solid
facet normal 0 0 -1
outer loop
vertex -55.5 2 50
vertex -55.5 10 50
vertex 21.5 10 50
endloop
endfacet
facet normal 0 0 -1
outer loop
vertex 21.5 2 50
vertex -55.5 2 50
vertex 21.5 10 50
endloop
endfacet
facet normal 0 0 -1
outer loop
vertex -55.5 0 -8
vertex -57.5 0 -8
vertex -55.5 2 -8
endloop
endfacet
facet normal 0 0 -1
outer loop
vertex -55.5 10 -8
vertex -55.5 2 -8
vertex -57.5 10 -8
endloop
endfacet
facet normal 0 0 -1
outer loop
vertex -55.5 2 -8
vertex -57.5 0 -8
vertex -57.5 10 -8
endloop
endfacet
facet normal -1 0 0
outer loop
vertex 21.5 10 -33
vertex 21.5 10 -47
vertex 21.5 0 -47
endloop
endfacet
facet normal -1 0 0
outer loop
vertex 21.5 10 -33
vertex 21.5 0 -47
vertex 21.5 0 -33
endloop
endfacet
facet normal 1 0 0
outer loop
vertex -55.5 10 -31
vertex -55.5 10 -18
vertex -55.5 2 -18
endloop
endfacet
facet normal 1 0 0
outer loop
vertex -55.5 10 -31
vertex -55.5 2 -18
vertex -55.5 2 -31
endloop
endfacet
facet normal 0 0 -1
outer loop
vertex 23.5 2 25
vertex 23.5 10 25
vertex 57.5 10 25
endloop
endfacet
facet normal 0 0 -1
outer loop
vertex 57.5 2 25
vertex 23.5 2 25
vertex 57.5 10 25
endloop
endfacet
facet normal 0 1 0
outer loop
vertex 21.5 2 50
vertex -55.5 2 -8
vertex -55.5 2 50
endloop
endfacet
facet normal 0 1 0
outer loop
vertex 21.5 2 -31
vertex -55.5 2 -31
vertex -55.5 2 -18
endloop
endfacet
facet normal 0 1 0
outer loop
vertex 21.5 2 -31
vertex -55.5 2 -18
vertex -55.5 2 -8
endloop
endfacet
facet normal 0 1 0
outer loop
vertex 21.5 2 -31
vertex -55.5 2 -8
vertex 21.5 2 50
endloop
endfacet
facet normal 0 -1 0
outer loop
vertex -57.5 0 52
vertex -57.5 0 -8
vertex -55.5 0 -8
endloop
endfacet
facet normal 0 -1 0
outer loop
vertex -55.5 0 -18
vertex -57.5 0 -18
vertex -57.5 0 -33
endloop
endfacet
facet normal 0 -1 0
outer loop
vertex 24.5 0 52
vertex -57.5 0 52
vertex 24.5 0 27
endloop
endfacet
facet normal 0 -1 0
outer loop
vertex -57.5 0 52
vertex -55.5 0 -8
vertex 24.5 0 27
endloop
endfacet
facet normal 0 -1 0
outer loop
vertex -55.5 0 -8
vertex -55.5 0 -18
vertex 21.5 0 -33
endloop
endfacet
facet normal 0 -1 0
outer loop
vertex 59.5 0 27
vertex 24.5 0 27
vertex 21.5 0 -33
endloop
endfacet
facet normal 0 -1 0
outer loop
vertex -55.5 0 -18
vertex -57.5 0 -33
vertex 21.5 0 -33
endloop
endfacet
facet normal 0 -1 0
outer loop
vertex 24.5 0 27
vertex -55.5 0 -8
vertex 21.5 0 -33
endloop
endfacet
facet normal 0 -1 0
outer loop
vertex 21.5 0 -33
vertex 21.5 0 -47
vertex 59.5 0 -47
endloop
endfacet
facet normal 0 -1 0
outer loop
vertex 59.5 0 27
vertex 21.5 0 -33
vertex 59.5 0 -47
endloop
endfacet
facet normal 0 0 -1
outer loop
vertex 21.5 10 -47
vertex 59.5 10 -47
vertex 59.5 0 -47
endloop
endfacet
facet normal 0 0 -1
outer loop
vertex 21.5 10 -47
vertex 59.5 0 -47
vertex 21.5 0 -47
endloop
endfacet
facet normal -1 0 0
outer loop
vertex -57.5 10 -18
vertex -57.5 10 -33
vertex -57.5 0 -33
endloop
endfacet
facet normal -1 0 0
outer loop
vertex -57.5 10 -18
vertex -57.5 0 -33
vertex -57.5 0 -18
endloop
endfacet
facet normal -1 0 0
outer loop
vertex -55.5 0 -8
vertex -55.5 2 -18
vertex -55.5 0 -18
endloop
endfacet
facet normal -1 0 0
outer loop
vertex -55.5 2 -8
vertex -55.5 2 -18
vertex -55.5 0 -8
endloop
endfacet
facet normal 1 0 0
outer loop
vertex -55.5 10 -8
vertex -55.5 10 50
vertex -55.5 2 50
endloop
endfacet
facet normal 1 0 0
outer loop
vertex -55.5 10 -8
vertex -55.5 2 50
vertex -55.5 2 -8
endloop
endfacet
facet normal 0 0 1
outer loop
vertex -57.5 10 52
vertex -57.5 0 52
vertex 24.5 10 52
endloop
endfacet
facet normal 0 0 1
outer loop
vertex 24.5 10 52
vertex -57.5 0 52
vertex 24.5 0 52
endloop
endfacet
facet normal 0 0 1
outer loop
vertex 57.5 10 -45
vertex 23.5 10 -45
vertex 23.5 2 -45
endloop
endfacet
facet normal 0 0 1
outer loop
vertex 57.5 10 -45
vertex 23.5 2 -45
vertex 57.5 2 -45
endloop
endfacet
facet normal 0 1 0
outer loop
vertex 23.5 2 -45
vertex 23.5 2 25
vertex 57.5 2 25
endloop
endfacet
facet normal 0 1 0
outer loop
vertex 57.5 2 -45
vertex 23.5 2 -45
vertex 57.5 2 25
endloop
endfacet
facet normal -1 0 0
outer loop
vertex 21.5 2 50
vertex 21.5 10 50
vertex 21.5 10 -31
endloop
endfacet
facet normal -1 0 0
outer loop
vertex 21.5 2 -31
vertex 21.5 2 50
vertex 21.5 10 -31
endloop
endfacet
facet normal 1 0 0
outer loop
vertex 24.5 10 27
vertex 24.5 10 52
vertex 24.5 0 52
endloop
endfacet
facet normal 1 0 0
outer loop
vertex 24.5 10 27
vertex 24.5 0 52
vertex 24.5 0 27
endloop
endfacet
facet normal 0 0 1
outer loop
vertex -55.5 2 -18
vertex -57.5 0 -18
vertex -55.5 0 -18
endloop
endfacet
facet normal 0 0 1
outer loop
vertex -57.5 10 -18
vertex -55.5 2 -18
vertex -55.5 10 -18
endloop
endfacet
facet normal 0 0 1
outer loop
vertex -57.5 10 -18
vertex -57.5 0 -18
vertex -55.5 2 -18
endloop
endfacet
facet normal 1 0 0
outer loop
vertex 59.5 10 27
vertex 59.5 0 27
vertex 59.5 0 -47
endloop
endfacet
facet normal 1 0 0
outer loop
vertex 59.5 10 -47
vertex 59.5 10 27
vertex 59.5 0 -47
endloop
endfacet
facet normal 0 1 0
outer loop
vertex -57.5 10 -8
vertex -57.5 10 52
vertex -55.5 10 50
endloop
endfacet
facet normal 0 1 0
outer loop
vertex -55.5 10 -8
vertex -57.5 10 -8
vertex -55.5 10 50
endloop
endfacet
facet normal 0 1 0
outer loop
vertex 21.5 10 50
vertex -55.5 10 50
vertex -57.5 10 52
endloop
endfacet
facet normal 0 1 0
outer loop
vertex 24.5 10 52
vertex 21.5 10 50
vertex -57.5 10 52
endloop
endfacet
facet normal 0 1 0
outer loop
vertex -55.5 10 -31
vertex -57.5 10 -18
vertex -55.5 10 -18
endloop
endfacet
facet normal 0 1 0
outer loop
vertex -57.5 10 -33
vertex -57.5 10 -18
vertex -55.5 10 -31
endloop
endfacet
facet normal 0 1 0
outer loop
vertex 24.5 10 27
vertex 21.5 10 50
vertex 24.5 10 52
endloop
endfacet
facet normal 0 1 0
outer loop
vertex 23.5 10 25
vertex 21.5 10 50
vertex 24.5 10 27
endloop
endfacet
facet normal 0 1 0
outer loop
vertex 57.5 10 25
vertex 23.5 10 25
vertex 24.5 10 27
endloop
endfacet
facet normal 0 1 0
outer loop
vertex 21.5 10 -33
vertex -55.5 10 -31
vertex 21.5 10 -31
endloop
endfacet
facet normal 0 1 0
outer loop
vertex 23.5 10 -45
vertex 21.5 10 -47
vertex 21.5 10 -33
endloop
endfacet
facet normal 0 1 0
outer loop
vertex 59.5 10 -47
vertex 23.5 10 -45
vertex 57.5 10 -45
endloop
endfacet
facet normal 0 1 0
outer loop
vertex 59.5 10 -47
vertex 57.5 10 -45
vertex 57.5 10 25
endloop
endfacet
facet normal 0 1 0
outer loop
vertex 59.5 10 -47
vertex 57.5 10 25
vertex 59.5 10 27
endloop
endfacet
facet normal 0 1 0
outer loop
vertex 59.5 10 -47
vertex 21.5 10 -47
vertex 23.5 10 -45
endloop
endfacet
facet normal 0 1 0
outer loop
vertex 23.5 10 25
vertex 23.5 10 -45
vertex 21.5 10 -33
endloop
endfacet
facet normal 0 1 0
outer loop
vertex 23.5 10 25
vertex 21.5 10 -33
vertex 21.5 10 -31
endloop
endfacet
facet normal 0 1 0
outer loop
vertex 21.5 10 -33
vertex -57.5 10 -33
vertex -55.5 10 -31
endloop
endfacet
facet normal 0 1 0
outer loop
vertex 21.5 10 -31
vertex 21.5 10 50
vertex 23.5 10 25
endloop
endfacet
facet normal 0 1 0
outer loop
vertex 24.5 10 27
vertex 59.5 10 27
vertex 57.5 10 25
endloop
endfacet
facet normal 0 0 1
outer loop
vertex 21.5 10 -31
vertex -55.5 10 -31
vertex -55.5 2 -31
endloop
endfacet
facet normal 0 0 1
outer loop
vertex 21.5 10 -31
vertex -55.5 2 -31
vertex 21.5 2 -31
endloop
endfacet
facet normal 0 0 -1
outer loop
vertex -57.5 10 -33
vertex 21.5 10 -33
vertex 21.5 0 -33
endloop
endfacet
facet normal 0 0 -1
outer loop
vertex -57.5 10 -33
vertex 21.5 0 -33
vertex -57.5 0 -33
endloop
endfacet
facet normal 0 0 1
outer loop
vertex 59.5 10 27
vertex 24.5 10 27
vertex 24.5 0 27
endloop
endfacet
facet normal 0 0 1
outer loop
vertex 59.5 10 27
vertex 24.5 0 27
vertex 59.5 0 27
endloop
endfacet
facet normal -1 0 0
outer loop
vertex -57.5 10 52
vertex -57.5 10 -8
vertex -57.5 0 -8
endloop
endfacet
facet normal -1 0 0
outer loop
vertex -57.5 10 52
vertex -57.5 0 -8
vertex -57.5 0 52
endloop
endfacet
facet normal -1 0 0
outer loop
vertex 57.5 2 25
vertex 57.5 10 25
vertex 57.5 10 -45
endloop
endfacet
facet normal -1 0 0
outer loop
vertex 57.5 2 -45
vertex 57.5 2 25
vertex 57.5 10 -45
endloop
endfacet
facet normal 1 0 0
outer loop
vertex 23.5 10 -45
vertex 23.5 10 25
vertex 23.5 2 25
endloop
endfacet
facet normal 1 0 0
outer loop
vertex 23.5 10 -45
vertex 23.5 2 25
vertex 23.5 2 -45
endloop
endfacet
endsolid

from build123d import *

# Parameters (mm, degrees)
SKETCH1_W           = 119
SKETCH1_H           = 104
BOSS_EXTRUDE1_DEPTH = 10
SKETCH2_W           = 35
SKETCH2_H           = 25
CUT_EXTRUDE1_DEPTH  = 80.650800373
SKETCH3_W           = 34
SKETCH3_H           = 70
CUT_EXTRUDE2_DEPTH  = 8
SKETCH4_W           = 77
SKETCH4_H           = 81
CUT_EXTRUDE3_DEPTH  = 8
CUT_EXTRUDE4_DEPTH  = 10
SKETCH7_W           = 10
SKETCH7_H           = 10
CUT_EXTRUDE6_DEPTH  = 2


with BuildPart() as part:
    # Sketch1 → Boss-Extrude1 (new body)
    with BuildSketch(Plane(origin=(0, 0, 0), x_dir=(1, 0, 0), z_dir=(0, 1, 0))):
        Rectangle(SKETCH1_W, SKETCH1_H)
    extrude(amount=BOSS_EXTRUDE1_DEPTH)

    # Sketch2 → Cut-Extrude1 (cut, through all)
    with BuildSketch(Plane(origin=(0, 10, 0), x_dir=(1, 0, 0), z_dir=(0, 1, 0))):
        with Locations((42, -39.5)):
            Rectangle(SKETCH2_W, SKETCH2_H)
    extrude(amount=-CUT_EXTRUDE1_DEPTH, mode=Mode.SUBTRACT)

    # Sketch3 → Cut-Extrude2 (cut)
    with BuildSketch(Plane(origin=(0, 10, 0), x_dir=(1, 0, 0), z_dir=(0, 1, 0))):
        with Locations((40.5, 10)):
            Rectangle(SKETCH3_W, SKETCH3_H)
    extrude(amount=-CUT_EXTRUDE2_DEPTH, mode=Mode.SUBTRACT)

    # Sketch4 → Cut-Extrude3 (cut)
    with BuildSketch(Plane(origin=(0, 10, 0), x_dir=(1, 0, 0), z_dir=(0, 1, 0))):
        with Locations((-17, -9.5)):
            Rectangle(SKETCH4_W, SKETCH4_H)
    extrude(amount=-CUT_EXTRUDE3_DEPTH, mode=Mode.SUBTRACT)

    # Sketch5 → Cut-Extrude4 (cut)
    with BuildSketch(Plane(origin=(0, 10, 0), x_dir=(1, 0, 0), z_dir=(0, 1, 0))):
        Polygon((-59.5, 52), (59.5, 52), (59.5, 47), (21.5, 47), (21.5, 33), (-57.5, 33), (-57.5, -52), (-59.5, -52), align=None)
    extrude(amount=-CUT_EXTRUDE4_DEPTH, mode=Mode.SUBTRACT)

    # Sketch7 → Cut-Extrude6 (cut)
    with BuildSketch(Plane.ZY.offset(57.5)):
        with Locations((-13, 5)):
            Rectangle(SKETCH7_W, SKETCH7_H)
    extrude(amount=-CUT_EXTRUDE6_DEPTH, mode=Mode.SUBTRACT)


solid = part.part
